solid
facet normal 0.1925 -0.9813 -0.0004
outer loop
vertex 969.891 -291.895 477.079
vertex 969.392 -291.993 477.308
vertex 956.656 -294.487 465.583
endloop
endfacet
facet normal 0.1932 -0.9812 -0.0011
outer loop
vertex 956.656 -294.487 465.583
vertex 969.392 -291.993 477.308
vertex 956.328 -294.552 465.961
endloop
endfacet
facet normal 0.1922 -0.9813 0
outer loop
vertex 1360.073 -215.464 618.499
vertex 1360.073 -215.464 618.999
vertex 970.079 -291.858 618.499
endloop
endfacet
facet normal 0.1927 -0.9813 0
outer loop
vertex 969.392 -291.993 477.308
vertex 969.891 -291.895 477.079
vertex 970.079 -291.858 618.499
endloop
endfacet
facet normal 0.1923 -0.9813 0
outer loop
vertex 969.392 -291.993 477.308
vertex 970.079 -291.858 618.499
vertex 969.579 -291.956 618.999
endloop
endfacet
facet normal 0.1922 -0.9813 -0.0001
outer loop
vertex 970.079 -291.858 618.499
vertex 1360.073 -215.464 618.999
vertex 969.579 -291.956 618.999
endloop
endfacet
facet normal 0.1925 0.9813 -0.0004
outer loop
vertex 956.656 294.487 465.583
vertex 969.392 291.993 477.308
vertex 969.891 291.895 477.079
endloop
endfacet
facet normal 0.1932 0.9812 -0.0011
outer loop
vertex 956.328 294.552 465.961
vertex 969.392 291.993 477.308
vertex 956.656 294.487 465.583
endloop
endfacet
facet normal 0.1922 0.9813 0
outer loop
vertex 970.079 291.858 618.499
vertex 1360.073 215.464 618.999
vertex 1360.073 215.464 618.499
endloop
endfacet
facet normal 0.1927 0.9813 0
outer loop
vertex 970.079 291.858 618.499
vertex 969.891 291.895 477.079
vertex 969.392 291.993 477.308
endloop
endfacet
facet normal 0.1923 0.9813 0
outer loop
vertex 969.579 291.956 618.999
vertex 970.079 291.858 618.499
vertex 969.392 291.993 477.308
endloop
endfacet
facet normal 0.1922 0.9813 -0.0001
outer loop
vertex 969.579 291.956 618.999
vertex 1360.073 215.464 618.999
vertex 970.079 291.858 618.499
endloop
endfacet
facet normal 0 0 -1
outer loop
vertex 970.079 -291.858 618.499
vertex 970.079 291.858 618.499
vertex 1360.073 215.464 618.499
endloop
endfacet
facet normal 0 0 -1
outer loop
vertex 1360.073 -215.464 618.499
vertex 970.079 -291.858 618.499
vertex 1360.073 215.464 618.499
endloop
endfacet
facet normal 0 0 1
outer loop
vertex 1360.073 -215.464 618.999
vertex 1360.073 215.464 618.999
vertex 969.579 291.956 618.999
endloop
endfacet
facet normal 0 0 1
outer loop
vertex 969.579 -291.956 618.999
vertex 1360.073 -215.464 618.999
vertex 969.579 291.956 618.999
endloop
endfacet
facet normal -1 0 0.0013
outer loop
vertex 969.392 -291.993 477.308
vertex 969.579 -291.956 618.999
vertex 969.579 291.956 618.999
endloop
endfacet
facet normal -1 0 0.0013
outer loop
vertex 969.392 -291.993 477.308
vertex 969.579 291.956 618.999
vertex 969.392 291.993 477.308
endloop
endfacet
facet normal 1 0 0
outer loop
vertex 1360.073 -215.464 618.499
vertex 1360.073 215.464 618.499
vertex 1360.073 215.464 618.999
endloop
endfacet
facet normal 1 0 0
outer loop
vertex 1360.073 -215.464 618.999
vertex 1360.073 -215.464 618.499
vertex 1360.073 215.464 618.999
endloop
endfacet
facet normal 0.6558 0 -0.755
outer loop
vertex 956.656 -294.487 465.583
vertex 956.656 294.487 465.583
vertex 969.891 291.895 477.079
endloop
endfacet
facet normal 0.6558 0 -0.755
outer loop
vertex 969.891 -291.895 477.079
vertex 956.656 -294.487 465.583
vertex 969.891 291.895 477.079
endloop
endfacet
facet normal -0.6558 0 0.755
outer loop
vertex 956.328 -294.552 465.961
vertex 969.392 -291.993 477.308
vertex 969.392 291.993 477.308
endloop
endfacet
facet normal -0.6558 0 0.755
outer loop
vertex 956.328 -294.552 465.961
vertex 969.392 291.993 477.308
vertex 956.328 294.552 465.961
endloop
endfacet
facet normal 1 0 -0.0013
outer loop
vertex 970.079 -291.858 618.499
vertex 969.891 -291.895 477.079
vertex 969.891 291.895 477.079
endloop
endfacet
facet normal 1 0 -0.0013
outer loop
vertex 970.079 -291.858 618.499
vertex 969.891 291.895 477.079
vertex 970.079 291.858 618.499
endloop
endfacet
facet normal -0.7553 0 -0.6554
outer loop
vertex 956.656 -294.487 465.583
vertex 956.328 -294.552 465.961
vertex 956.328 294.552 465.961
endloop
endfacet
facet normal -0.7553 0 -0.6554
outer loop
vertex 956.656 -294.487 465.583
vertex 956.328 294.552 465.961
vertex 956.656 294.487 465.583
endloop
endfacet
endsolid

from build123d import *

# Parameters (mm, degrees)
WYCI_GNI_CIE_CIENKA_CIANKA1_DEPTH      = 400
WYCI_GNI_CIE_CIENKA_CIANKA1_DEPTH_BACK = 400


with BuildPart() as part:
    # Szkic3 → Wyciągnięcie-cienka ścianka1 (new, two sides)
    with BuildSketch(Plane(origin=(0, 0, 0), x_dir=(1, 0, 0), z_dir=(0, 1, 0))) as wyci_gni_cie_cienka_cianka1_sk:
        Polygon((956.655966162, -465.583132528), (969.891434648, -477.079346089), (970.078511471, -618.499346089), (1360.07269303, -618.499346089), (1360.07269303, -618.999346089), (969.579172456, -618.999346089), (969.391736143, -477.307590729), (956.328086187, -465.960617259), align=None)
    extrude(amount=WYCI_GNI_CIE_CIENKA_CIANKA1_DEPTH)
    extrude(wyci_gni_cie_cienka_cianka1_sk.sketch, amount=-WYCI_GNI_CIE_CIENKA_CIANKA1_DEPTH_BACK)

    # Cięcie powierzchnią1
    split(bisect_by=Plane(origin=(90.906039695, -464.075841363, 0), x_dir=(-0.9813493581662637, -0.19223276834780917, 0), z_dir=(-0.19223276834780917, 0.9813493581662637, 0)), keep=Keep.TOP)

    # Cięcie powierzchnią2
    split(bisect_by=Plane(origin=(90.906039695, 464.075841363, 0), x_dir=(-0.9813493581662637, 0.19223276834780917, 0), z_dir=(0.19223276834780917, 0.9813493581662637, 0)), keep=Keep.BOTTOM)


solid = part.part
